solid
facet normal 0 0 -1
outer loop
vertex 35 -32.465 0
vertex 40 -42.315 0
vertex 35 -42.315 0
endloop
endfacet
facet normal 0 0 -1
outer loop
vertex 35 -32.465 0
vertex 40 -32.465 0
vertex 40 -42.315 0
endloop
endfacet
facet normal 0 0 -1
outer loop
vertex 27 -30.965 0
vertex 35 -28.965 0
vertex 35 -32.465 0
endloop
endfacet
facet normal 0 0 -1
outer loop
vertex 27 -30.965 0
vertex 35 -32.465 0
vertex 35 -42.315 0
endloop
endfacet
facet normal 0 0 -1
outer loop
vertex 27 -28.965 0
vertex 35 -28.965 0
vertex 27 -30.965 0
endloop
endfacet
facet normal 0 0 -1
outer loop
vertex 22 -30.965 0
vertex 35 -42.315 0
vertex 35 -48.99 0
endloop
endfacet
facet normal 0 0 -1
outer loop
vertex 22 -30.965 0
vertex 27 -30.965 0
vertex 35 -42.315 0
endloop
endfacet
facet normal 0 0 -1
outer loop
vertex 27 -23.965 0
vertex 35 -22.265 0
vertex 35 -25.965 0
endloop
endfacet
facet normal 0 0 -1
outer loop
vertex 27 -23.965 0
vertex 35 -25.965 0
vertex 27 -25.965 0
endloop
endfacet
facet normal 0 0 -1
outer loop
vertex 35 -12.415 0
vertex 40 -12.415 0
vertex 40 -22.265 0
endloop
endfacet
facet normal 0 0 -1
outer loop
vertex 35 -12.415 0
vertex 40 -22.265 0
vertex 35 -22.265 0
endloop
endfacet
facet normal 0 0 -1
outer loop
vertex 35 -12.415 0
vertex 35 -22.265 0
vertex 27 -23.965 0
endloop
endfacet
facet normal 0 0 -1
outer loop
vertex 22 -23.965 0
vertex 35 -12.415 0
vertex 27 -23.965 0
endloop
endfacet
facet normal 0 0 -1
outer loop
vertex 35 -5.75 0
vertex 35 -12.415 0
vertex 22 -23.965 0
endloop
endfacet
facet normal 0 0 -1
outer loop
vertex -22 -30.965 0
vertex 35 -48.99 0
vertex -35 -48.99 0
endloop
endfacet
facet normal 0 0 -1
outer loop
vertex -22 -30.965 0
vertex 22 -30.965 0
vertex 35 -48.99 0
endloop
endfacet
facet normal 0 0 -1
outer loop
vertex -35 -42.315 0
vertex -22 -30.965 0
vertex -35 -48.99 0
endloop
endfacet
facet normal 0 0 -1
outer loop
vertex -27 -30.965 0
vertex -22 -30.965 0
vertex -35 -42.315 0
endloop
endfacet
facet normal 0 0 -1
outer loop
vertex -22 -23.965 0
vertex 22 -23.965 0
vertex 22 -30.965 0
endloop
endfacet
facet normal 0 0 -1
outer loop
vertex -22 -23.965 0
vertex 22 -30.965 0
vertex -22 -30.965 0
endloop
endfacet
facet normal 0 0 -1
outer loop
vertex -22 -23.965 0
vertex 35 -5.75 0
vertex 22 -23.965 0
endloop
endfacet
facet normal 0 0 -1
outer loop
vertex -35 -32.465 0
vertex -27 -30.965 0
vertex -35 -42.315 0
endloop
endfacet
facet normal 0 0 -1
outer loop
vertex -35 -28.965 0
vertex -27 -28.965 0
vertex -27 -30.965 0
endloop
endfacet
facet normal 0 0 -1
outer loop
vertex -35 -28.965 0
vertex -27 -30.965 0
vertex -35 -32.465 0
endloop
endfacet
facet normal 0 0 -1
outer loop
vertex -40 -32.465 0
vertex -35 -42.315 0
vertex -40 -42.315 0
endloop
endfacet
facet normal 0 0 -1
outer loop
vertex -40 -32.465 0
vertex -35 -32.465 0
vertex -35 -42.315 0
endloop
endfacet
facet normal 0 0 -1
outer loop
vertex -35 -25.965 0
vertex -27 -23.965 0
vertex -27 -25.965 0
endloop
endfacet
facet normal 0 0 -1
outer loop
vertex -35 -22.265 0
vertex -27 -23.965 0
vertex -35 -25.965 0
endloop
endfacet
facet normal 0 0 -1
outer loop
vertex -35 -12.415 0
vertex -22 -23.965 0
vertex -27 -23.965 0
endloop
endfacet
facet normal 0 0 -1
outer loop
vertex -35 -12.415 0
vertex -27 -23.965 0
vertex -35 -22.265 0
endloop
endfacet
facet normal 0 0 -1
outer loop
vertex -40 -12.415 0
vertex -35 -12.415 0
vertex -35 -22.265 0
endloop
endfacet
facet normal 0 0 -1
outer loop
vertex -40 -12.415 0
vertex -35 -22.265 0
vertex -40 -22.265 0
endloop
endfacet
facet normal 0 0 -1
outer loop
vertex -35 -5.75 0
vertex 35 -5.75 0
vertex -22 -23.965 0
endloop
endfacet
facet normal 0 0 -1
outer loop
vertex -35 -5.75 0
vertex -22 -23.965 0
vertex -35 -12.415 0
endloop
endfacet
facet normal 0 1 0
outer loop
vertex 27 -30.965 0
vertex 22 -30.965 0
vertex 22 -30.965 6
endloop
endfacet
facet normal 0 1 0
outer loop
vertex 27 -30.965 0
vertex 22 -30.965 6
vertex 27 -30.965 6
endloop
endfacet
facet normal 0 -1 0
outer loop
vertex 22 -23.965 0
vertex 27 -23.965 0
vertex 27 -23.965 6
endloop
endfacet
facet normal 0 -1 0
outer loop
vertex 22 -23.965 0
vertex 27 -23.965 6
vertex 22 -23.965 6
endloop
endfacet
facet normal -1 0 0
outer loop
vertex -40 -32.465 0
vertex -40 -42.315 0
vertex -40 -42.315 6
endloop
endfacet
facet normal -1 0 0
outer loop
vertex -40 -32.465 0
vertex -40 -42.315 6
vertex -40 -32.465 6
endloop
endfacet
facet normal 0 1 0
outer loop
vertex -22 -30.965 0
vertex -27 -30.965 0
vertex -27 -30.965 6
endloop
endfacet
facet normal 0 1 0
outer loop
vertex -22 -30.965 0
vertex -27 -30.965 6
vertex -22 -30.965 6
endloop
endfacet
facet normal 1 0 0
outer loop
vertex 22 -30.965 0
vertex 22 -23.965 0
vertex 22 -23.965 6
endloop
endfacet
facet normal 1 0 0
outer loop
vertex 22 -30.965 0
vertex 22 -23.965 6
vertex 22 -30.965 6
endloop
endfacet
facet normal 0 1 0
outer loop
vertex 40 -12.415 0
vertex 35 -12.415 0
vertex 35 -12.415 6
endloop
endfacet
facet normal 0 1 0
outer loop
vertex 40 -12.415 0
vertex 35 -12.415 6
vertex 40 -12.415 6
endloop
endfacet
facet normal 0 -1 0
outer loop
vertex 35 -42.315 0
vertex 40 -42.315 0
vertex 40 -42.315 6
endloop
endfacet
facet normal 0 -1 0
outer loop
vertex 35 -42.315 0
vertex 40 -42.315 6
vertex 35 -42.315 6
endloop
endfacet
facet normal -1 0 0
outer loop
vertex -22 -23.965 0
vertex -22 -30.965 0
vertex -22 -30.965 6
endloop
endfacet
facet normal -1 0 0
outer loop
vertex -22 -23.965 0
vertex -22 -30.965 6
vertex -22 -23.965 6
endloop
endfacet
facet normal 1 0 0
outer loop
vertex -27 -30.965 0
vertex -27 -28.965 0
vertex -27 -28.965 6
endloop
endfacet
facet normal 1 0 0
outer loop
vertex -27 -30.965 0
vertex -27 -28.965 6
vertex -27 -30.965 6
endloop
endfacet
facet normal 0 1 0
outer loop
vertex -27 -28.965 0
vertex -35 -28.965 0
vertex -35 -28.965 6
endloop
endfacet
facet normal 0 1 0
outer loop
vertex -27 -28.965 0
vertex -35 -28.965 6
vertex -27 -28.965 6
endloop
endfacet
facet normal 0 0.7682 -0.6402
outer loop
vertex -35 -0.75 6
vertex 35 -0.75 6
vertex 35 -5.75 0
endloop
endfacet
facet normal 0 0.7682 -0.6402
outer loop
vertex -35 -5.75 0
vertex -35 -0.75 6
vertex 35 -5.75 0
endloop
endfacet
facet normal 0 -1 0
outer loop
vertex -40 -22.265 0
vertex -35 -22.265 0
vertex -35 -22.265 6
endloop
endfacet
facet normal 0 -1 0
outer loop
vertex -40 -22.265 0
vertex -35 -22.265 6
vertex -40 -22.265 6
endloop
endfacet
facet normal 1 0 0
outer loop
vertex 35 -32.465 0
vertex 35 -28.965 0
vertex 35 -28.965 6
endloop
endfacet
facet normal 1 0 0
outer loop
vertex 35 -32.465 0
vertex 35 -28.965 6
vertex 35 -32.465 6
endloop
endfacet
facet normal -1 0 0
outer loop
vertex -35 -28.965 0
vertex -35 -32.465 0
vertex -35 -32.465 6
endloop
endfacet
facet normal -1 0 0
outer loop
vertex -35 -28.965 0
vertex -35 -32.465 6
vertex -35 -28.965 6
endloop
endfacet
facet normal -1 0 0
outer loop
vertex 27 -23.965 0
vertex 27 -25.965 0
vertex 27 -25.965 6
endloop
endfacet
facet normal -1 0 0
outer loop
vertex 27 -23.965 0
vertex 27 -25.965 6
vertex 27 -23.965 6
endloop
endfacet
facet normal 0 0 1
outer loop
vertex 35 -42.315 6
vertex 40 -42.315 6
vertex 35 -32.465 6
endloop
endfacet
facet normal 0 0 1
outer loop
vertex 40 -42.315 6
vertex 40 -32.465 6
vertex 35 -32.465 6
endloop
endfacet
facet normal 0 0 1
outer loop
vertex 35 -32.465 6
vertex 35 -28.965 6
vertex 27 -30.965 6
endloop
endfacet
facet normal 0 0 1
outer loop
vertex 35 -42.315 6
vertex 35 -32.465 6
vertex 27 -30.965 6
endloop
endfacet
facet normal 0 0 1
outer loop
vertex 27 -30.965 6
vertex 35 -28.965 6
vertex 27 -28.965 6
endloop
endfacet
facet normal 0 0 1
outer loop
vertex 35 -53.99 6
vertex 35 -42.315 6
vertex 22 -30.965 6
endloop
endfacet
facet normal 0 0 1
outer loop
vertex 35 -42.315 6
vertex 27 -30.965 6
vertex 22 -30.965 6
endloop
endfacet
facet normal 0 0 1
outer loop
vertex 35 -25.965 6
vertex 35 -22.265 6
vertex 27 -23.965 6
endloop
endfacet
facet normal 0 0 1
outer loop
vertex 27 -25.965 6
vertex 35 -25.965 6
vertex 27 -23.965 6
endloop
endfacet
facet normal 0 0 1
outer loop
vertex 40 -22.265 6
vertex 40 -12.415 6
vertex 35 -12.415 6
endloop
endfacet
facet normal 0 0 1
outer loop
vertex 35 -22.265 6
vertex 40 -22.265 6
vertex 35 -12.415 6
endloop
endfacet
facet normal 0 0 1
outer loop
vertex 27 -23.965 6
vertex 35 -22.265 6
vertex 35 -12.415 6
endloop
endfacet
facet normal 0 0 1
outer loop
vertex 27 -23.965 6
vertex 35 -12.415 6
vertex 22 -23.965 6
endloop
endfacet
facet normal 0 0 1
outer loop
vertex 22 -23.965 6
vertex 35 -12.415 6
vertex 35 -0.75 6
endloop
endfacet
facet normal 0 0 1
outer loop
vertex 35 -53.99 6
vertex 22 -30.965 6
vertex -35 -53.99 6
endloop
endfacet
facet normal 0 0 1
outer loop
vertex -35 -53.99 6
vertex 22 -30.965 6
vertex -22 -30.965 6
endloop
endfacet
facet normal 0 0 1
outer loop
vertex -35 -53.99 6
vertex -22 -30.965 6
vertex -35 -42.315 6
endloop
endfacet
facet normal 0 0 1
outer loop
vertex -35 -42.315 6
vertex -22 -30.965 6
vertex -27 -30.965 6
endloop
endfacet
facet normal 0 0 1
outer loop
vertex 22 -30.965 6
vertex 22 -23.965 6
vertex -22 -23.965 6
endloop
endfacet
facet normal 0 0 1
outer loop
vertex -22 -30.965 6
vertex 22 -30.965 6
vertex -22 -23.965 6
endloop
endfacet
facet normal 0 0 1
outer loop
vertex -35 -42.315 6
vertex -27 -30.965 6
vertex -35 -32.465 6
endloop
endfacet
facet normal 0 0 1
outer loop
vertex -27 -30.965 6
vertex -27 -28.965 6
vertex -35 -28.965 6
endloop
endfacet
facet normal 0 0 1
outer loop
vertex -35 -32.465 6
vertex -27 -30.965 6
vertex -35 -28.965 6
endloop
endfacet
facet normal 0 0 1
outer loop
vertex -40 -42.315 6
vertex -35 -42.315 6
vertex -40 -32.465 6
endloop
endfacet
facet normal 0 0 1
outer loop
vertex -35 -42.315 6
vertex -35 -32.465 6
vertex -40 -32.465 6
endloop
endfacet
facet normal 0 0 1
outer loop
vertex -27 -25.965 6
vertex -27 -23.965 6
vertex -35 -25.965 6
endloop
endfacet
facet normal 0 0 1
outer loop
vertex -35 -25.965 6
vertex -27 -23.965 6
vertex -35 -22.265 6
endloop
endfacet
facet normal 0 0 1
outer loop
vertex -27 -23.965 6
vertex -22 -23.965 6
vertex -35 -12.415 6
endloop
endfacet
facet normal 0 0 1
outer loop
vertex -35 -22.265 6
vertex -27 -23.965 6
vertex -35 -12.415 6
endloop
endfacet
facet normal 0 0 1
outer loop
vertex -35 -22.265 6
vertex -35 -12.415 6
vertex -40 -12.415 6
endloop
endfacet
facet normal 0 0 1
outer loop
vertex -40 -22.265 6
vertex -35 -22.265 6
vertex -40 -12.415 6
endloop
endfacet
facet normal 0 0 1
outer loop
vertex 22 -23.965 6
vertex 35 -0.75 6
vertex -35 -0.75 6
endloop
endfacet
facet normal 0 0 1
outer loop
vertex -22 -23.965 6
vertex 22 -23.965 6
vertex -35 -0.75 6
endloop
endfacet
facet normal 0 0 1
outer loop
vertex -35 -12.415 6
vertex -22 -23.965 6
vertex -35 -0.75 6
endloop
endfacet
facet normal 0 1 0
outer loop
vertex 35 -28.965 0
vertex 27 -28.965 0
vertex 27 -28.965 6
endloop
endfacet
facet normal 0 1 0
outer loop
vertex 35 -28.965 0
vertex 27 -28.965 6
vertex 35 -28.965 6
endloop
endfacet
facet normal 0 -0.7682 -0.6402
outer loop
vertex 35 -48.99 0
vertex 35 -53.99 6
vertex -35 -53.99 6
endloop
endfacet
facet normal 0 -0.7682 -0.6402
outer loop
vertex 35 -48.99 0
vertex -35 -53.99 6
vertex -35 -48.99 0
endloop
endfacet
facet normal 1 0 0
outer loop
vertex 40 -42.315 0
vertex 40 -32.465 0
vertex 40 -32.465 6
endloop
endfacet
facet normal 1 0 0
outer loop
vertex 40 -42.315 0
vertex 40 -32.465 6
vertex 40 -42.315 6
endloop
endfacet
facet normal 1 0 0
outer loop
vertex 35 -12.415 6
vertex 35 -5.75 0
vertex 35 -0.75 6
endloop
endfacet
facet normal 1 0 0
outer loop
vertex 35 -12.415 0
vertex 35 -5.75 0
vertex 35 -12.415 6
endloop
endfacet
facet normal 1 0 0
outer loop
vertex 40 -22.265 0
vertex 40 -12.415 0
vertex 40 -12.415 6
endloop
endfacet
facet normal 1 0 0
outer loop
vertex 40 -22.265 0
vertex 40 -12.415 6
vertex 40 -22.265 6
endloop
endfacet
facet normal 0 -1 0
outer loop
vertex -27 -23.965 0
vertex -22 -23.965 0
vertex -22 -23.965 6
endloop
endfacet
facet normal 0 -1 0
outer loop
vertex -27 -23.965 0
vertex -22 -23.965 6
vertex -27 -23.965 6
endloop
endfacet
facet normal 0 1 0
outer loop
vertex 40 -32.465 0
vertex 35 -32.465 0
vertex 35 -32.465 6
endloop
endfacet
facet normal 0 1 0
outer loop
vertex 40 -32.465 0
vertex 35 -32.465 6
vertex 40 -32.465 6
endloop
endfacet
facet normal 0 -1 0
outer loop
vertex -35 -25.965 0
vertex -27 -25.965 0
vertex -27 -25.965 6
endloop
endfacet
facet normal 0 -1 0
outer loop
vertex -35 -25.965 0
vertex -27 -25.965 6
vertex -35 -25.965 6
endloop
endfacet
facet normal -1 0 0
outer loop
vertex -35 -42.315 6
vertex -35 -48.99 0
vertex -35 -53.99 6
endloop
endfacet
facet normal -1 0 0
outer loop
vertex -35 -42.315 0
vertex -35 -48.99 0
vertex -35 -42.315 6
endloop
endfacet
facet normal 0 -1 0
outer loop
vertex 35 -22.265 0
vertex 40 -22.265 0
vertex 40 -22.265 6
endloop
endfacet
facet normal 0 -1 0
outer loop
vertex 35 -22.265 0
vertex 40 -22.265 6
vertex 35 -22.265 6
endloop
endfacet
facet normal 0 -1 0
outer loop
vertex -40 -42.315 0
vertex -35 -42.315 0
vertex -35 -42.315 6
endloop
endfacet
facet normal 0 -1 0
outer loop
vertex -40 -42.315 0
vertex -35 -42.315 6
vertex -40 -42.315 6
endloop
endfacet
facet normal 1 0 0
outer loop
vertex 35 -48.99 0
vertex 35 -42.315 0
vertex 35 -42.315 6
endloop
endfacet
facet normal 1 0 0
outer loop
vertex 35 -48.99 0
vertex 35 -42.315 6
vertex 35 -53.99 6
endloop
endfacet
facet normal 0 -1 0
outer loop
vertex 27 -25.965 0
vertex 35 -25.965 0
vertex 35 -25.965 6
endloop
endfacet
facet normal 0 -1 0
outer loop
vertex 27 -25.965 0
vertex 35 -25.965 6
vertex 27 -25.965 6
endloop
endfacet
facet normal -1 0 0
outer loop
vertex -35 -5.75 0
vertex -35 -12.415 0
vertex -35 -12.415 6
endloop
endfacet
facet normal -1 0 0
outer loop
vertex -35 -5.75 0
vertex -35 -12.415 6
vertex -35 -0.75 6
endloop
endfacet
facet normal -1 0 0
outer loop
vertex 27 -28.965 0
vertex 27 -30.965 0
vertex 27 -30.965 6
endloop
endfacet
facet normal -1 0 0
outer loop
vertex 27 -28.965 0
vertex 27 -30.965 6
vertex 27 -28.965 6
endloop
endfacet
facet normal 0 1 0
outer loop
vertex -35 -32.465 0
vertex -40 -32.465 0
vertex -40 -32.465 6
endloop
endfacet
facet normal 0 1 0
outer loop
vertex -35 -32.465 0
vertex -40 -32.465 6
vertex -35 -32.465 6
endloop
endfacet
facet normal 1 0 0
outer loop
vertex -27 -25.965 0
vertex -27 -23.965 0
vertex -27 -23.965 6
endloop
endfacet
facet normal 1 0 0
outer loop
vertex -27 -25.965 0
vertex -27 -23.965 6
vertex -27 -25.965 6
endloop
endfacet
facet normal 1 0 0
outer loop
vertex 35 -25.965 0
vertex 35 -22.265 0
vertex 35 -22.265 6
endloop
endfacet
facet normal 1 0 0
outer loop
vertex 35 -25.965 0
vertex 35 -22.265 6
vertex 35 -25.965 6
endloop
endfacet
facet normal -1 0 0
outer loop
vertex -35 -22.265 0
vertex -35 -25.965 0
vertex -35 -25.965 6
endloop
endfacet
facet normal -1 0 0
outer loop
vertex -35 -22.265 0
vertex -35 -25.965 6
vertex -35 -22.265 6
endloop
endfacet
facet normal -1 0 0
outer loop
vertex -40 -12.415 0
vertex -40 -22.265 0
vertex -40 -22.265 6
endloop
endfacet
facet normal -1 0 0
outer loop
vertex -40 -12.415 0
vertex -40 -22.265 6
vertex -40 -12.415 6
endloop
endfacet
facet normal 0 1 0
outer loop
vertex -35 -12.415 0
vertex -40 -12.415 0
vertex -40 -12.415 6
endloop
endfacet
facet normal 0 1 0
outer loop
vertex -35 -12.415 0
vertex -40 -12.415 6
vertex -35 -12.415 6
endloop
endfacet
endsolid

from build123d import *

# Parameters (mm, degrees)
RESSALTO_EXTRUS_O1_DEPTH = 6
CORTE_EXTRUS_O2_DEPTH    = 76


with BuildPart() as part:
    # Model → Ressalto-extrusão1 (new body)
    with BuildSketch(Plane.XY):
        Polygon((35, -42.315), (35, -54.735), (-35, -54.735), (-35, -42.315), (-40, -42.315), (-40, -32.465), (-35, -32.465), (-35, -28.965000001), (-27, -28.965000001), (-27, -30.965000001), (-22, -30.965000001), (-22, -23.965000001), (-27, -23.965000001), (-27, -25.965000001), (-35, -25.965000001), (-35, -22.265), (-40, -22.265), (-40, -12.415), (-35, -12.415), (-35, 0), (35, 0), (35, -12.415), (40, -12.415), (40, -22.265), (35, -22.265), (35, -25.965000001), (27, -25.965000001), (27, -23.965000001), (22, -23.965000001), (22, -30.965000001), (27, -30.965000001), (27, -28.965000001), (35, -28.965000001), (35, -32.465), (40, -32.465), (40, -42.315), align=None)
    extrude(amount=RESSALTO_EXTRUS_O1_DEPTH)

    # Esboço2 → Corte-extrusão2 (cut, through all)
    with BuildSketch(Plane(origin=(35, 0, 0), x_dir=(0, 0, -1), z_dir=(1, 0, 0))):
        Polygon((-6, -0.75), (0, -5.75), (0, 4.25), (-6, 4.25), align=None)
        Polygon((-6, -58.99), (-6, -53.99), (0, -48.99), (0, -58.99), align=None)
    extrude(amount=-CORTE_EXTRUS_O2_DEPTH, mode=Mode.SUBTRACT)


solid = part.part
